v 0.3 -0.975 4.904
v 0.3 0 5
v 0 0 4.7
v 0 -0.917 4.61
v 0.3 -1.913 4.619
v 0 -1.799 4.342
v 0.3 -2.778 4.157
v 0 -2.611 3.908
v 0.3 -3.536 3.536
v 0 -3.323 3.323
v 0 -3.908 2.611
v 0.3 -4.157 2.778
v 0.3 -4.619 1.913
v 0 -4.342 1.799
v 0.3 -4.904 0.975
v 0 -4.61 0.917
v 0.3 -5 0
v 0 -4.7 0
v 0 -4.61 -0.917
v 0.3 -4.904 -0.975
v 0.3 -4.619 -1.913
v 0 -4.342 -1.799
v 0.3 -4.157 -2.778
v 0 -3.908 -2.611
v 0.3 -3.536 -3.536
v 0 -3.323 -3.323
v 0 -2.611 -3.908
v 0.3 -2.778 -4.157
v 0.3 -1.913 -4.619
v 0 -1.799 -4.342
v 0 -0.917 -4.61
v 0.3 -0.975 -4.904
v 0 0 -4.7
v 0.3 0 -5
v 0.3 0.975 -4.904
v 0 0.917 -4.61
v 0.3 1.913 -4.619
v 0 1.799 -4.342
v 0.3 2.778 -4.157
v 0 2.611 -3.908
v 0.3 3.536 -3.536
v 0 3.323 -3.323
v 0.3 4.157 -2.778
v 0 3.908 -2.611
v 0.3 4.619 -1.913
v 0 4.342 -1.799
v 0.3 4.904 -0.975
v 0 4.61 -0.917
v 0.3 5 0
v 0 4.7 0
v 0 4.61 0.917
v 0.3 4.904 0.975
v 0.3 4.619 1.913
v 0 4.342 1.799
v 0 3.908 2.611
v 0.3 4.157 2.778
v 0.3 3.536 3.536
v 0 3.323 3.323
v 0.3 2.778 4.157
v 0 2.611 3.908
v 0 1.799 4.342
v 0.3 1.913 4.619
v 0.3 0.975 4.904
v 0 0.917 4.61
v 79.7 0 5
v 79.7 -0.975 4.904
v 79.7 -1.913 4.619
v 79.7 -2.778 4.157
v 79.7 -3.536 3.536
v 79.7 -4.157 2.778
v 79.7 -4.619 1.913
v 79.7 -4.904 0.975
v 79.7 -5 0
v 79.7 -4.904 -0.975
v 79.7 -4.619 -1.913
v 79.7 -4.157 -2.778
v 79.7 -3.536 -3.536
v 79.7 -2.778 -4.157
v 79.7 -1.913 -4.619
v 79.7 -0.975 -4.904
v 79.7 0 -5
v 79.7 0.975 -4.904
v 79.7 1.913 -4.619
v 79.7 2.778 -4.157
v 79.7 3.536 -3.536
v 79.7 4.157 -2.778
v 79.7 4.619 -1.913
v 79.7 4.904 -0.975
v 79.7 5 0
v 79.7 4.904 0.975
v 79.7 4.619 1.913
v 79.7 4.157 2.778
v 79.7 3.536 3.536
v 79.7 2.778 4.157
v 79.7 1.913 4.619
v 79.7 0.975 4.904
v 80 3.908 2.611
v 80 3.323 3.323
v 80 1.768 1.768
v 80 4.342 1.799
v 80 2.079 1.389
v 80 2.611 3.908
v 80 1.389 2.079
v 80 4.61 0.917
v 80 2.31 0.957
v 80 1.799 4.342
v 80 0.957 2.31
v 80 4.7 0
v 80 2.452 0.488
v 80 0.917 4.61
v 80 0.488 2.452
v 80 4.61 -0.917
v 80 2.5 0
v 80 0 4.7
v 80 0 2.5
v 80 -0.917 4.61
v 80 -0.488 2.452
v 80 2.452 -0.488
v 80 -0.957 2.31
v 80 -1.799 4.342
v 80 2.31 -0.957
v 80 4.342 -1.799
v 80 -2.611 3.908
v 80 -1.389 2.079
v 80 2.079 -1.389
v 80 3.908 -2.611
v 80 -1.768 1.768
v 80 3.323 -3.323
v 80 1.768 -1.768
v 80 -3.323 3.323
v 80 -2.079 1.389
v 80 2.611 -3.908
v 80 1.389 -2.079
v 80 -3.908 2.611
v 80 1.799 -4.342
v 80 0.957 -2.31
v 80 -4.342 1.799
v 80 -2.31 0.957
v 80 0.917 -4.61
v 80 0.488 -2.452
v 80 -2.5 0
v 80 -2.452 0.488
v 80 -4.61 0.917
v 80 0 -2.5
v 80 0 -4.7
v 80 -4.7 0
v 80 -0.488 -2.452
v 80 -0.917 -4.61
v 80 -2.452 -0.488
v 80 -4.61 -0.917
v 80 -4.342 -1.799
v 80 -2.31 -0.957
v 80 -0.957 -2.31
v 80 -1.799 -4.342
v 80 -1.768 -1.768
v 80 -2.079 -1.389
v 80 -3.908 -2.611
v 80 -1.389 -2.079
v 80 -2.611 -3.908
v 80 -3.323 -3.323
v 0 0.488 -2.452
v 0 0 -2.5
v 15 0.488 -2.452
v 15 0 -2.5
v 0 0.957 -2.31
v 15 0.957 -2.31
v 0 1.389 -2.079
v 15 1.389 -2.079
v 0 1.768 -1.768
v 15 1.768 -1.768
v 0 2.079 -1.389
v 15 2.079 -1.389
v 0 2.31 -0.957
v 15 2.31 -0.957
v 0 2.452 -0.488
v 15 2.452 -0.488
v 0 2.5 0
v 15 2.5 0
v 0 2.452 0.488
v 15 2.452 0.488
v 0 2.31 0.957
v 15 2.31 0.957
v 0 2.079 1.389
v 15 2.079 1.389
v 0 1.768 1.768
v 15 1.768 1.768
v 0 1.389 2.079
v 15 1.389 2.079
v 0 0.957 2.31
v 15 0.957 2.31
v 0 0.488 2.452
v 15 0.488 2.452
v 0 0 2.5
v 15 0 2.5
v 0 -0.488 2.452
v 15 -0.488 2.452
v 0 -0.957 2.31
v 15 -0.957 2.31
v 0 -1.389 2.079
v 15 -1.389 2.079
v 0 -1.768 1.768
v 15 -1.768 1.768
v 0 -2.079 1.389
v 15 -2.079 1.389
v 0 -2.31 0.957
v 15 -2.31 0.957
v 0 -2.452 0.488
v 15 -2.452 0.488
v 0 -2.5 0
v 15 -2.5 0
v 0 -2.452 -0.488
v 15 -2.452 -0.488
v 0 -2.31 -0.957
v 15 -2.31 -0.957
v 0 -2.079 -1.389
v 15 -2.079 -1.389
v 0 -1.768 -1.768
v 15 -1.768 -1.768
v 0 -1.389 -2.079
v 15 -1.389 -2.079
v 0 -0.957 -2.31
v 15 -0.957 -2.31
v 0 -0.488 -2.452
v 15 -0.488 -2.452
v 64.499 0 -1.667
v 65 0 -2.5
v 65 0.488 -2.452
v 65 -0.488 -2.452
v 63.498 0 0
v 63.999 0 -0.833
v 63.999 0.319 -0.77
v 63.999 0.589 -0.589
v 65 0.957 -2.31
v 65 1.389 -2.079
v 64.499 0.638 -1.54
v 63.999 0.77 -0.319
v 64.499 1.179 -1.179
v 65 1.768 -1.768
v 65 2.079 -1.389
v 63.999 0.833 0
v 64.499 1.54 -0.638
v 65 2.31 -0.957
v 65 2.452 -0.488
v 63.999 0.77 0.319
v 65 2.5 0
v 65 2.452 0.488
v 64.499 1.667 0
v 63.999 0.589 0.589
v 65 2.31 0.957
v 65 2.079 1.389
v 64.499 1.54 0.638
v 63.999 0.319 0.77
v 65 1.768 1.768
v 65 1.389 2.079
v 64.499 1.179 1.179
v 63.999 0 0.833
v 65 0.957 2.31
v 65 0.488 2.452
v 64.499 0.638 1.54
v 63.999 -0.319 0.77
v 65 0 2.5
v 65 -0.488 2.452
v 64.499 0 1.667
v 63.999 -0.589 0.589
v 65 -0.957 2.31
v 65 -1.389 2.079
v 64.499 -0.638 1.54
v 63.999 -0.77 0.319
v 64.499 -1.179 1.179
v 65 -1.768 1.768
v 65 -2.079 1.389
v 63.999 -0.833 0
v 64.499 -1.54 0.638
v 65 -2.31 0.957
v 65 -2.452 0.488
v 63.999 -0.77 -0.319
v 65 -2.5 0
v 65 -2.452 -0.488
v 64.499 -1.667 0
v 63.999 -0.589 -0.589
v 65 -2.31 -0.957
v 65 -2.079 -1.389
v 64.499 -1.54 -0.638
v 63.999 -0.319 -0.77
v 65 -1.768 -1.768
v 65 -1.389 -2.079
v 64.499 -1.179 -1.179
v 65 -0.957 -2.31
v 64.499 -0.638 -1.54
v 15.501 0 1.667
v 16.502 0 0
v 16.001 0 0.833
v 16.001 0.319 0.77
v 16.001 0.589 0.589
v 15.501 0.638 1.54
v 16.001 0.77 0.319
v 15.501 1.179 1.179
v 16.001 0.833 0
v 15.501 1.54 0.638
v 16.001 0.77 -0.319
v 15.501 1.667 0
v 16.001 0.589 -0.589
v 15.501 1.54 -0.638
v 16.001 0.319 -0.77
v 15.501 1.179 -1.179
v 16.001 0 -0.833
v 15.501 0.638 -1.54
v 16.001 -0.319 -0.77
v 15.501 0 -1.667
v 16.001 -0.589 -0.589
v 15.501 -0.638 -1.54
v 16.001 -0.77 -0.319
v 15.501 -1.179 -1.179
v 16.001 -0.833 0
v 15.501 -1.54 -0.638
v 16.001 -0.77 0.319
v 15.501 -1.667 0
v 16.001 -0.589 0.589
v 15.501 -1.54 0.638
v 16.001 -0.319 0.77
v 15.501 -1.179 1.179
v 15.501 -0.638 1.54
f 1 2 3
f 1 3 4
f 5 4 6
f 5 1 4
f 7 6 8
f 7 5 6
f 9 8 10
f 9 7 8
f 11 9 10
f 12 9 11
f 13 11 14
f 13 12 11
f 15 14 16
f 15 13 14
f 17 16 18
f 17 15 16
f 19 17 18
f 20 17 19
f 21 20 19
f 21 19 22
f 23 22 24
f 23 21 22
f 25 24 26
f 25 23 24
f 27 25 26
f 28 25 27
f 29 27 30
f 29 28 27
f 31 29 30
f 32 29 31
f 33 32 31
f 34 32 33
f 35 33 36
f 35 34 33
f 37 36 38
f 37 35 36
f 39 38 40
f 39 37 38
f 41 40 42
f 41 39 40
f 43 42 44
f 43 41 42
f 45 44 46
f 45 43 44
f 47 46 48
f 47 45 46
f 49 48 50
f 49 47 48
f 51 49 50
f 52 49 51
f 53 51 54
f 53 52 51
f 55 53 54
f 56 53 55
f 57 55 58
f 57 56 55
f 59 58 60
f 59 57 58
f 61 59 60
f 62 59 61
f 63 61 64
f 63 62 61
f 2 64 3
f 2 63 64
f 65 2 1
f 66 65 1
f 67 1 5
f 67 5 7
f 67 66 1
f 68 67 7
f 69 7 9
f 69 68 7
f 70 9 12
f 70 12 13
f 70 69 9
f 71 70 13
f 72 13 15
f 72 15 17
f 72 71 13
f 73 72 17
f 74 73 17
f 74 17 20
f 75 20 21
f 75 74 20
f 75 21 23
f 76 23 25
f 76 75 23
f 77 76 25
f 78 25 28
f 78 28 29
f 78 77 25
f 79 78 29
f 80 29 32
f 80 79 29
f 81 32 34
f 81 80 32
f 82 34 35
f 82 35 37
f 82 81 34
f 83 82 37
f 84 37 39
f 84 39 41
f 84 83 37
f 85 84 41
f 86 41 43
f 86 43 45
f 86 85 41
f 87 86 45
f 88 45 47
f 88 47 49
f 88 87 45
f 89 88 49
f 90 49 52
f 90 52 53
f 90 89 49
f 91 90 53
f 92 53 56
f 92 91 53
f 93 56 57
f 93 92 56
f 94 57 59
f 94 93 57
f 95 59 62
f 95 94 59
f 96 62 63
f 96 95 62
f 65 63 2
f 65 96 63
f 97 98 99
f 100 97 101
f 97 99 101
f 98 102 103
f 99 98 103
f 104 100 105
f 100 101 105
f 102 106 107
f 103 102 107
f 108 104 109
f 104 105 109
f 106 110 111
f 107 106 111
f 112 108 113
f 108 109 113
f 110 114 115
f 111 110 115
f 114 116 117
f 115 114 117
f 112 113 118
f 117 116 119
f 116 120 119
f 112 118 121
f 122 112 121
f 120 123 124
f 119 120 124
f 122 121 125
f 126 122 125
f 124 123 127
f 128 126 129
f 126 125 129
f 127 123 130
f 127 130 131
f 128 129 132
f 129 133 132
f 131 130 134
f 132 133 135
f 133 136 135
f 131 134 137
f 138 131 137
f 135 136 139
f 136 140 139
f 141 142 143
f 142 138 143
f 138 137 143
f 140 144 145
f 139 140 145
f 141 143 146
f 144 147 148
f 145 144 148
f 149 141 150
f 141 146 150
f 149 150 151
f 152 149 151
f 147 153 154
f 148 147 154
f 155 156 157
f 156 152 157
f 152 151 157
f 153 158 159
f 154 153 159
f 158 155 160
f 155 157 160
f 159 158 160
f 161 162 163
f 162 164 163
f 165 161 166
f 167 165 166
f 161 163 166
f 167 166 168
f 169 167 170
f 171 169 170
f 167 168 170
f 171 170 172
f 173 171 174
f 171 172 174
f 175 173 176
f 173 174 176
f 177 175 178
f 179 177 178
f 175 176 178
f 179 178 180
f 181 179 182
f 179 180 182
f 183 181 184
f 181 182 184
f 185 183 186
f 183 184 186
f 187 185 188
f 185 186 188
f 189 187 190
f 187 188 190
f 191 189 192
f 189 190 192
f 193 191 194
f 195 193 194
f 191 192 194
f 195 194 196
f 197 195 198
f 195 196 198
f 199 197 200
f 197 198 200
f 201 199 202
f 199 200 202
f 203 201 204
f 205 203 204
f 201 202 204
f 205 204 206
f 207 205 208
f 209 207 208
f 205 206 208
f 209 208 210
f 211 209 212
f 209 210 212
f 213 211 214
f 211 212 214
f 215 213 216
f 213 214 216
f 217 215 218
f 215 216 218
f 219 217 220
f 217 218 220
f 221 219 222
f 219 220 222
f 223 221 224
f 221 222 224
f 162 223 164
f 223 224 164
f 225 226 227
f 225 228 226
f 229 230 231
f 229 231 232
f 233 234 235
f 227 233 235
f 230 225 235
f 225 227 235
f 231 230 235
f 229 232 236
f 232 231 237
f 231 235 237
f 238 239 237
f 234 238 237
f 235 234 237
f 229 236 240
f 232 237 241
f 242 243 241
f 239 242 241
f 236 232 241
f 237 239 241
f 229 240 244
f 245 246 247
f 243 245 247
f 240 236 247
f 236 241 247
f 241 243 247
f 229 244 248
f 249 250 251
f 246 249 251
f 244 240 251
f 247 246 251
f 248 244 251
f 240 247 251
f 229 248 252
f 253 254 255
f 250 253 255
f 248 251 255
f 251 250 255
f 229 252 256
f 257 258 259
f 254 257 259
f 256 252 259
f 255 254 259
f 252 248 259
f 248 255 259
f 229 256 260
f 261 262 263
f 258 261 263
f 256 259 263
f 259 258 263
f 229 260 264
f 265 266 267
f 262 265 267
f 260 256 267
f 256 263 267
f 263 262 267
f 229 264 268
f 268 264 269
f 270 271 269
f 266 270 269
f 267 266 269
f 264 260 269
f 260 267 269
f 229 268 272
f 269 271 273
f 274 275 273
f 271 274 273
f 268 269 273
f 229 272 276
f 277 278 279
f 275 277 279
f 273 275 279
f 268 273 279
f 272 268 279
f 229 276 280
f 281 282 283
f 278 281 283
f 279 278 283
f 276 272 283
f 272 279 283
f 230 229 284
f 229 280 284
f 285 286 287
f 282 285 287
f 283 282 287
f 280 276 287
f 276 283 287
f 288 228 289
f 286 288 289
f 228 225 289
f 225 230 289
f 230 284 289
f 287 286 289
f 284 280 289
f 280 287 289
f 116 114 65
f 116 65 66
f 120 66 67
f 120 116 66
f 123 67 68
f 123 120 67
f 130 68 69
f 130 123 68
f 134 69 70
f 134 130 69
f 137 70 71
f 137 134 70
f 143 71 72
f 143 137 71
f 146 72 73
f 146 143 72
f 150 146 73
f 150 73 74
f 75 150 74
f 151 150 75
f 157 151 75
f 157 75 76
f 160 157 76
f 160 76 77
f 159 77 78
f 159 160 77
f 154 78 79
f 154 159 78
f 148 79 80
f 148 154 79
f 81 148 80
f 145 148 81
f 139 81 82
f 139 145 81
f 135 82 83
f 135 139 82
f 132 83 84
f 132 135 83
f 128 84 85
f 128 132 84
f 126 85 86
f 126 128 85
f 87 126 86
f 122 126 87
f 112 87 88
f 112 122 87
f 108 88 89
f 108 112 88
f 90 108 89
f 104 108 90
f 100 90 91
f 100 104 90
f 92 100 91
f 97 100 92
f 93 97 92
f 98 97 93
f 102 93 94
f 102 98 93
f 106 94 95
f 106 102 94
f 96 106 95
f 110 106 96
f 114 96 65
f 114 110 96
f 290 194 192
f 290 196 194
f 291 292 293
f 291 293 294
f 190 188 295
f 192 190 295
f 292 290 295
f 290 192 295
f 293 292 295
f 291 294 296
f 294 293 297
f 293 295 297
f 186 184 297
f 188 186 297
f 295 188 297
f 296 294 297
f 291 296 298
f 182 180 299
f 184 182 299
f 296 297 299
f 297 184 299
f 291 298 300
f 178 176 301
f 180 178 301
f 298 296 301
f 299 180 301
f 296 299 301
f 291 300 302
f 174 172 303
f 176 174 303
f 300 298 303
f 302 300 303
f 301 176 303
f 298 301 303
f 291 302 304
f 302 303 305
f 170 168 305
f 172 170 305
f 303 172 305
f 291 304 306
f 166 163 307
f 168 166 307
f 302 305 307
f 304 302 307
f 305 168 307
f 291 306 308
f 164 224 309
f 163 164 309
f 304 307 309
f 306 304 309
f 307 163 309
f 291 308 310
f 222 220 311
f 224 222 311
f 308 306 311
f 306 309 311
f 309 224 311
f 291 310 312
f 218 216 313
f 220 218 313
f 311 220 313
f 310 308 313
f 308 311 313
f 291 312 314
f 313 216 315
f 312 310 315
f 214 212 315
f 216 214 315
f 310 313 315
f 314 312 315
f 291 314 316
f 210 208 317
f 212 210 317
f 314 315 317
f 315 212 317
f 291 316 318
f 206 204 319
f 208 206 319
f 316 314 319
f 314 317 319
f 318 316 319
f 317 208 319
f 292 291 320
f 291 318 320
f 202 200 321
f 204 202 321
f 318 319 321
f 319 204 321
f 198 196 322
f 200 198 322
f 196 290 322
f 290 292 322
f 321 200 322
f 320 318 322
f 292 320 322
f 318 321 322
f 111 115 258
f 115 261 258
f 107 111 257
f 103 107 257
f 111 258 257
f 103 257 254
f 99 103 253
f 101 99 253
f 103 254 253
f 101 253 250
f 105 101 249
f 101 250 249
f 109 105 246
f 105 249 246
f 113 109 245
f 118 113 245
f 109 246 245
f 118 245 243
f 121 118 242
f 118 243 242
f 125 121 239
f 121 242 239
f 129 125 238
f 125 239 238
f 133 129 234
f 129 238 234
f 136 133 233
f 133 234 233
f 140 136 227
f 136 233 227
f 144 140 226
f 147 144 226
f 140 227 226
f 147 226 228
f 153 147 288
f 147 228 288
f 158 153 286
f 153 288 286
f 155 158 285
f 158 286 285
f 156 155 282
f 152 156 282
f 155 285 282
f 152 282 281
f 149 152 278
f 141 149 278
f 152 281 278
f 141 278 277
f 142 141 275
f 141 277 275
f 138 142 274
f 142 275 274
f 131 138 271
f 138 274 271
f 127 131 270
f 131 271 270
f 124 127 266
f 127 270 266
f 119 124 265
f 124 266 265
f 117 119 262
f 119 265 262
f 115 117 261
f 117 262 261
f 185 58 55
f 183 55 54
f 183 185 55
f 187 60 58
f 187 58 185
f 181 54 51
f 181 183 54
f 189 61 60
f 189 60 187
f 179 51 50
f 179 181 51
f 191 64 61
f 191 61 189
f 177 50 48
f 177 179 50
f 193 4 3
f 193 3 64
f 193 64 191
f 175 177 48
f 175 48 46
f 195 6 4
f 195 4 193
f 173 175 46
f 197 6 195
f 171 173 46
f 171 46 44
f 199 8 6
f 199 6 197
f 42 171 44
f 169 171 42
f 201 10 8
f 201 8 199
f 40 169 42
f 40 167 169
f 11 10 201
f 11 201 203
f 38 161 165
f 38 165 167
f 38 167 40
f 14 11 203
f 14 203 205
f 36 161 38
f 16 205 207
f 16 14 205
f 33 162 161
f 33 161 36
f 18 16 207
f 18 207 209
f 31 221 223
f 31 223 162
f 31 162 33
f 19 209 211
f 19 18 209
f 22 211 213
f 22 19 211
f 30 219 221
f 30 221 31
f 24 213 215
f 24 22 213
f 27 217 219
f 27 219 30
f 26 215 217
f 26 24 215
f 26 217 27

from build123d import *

# Parameters (mm, degrees)
SKETCH_1_W             = 80
SKETCH_1_H             = 5
HOLE_WIZARD_M6_1_D     = 5
HOLE_WIZARD_M6_1_DEPTH = 15
HOLE_WIZARD_M6_1_TIP   = 1.502151548
HOLE_WIZARD_M6_2_D     = 5
HOLE_WIZARD_M6_2_DEPTH = 15
HOLE_WIZARD_M6_2_TIP   = 1.502151548
CHAMFER_1_SIZE         = 0.3


with BuildPart() as part:
    # 草图1 → 旋转1 (revolve)
    with BuildSketch(Plane(origin=(0, 0, 0), x_dir=(1, 0, 0), z_dir=(0, 1, 0)), mode=Mode.PRIVATE) as revolve_1_sk:
        with Locations((40, 2.5)):
            Rectangle(SKETCH_1_W, SKETCH_1_H)
    revolve(revolve_1_sk.sketch.rotate(Axis((-1000, 0, 0), (1, 0, 0)), 180), axis=Axis((-1000, 0, 0), (1, 0, 0)))

    # M6 螺纹孔1
    with Locations(Plane(origin=(80, 0, 0), x_dir=(0, 0, -1), z_dir=(1, 0, 0))):
        with Locations((0, 0)):
            Hole(HOLE_WIZARD_M6_1_D / 2, depth=HOLE_WIZARD_M6_1_DEPTH)
            with Locations((0, 0, -(HOLE_WIZARD_M6_1_DEPTH + HOLE_WIZARD_M6_1_TIP / 2))):  # 118° drill point
                Cone(0, HOLE_WIZARD_M6_1_D / 2, HOLE_WIZARD_M6_1_TIP, mode=Mode.SUBTRACT)

    # M6 螺纹孔2
    with Locations(Plane.ZY):
        with Locations((0, 0)):
            Hole(HOLE_WIZARD_M6_2_D / 2, depth=HOLE_WIZARD_M6_2_DEPTH)
            with Locations((0, 0, -(HOLE_WIZARD_M6_2_DEPTH + HOLE_WIZARD_M6_2_TIP / 2))):  # 118° drill point
                Cone(0, HOLE_WIZARD_M6_2_D / 2, HOLE_WIZARD_M6_2_TIP, mode=Mode.SUBTRACT)

    # 倒角1
    chamfer_1_edges = [part.edges().sort_by_distance(p)[0] for p in [
        (80, 0, -5),
        (0, 0, -5),
    ]]
    chamfer(chamfer_1_edges, length=CHAMFER_1_SIZE)


solid = part.part
